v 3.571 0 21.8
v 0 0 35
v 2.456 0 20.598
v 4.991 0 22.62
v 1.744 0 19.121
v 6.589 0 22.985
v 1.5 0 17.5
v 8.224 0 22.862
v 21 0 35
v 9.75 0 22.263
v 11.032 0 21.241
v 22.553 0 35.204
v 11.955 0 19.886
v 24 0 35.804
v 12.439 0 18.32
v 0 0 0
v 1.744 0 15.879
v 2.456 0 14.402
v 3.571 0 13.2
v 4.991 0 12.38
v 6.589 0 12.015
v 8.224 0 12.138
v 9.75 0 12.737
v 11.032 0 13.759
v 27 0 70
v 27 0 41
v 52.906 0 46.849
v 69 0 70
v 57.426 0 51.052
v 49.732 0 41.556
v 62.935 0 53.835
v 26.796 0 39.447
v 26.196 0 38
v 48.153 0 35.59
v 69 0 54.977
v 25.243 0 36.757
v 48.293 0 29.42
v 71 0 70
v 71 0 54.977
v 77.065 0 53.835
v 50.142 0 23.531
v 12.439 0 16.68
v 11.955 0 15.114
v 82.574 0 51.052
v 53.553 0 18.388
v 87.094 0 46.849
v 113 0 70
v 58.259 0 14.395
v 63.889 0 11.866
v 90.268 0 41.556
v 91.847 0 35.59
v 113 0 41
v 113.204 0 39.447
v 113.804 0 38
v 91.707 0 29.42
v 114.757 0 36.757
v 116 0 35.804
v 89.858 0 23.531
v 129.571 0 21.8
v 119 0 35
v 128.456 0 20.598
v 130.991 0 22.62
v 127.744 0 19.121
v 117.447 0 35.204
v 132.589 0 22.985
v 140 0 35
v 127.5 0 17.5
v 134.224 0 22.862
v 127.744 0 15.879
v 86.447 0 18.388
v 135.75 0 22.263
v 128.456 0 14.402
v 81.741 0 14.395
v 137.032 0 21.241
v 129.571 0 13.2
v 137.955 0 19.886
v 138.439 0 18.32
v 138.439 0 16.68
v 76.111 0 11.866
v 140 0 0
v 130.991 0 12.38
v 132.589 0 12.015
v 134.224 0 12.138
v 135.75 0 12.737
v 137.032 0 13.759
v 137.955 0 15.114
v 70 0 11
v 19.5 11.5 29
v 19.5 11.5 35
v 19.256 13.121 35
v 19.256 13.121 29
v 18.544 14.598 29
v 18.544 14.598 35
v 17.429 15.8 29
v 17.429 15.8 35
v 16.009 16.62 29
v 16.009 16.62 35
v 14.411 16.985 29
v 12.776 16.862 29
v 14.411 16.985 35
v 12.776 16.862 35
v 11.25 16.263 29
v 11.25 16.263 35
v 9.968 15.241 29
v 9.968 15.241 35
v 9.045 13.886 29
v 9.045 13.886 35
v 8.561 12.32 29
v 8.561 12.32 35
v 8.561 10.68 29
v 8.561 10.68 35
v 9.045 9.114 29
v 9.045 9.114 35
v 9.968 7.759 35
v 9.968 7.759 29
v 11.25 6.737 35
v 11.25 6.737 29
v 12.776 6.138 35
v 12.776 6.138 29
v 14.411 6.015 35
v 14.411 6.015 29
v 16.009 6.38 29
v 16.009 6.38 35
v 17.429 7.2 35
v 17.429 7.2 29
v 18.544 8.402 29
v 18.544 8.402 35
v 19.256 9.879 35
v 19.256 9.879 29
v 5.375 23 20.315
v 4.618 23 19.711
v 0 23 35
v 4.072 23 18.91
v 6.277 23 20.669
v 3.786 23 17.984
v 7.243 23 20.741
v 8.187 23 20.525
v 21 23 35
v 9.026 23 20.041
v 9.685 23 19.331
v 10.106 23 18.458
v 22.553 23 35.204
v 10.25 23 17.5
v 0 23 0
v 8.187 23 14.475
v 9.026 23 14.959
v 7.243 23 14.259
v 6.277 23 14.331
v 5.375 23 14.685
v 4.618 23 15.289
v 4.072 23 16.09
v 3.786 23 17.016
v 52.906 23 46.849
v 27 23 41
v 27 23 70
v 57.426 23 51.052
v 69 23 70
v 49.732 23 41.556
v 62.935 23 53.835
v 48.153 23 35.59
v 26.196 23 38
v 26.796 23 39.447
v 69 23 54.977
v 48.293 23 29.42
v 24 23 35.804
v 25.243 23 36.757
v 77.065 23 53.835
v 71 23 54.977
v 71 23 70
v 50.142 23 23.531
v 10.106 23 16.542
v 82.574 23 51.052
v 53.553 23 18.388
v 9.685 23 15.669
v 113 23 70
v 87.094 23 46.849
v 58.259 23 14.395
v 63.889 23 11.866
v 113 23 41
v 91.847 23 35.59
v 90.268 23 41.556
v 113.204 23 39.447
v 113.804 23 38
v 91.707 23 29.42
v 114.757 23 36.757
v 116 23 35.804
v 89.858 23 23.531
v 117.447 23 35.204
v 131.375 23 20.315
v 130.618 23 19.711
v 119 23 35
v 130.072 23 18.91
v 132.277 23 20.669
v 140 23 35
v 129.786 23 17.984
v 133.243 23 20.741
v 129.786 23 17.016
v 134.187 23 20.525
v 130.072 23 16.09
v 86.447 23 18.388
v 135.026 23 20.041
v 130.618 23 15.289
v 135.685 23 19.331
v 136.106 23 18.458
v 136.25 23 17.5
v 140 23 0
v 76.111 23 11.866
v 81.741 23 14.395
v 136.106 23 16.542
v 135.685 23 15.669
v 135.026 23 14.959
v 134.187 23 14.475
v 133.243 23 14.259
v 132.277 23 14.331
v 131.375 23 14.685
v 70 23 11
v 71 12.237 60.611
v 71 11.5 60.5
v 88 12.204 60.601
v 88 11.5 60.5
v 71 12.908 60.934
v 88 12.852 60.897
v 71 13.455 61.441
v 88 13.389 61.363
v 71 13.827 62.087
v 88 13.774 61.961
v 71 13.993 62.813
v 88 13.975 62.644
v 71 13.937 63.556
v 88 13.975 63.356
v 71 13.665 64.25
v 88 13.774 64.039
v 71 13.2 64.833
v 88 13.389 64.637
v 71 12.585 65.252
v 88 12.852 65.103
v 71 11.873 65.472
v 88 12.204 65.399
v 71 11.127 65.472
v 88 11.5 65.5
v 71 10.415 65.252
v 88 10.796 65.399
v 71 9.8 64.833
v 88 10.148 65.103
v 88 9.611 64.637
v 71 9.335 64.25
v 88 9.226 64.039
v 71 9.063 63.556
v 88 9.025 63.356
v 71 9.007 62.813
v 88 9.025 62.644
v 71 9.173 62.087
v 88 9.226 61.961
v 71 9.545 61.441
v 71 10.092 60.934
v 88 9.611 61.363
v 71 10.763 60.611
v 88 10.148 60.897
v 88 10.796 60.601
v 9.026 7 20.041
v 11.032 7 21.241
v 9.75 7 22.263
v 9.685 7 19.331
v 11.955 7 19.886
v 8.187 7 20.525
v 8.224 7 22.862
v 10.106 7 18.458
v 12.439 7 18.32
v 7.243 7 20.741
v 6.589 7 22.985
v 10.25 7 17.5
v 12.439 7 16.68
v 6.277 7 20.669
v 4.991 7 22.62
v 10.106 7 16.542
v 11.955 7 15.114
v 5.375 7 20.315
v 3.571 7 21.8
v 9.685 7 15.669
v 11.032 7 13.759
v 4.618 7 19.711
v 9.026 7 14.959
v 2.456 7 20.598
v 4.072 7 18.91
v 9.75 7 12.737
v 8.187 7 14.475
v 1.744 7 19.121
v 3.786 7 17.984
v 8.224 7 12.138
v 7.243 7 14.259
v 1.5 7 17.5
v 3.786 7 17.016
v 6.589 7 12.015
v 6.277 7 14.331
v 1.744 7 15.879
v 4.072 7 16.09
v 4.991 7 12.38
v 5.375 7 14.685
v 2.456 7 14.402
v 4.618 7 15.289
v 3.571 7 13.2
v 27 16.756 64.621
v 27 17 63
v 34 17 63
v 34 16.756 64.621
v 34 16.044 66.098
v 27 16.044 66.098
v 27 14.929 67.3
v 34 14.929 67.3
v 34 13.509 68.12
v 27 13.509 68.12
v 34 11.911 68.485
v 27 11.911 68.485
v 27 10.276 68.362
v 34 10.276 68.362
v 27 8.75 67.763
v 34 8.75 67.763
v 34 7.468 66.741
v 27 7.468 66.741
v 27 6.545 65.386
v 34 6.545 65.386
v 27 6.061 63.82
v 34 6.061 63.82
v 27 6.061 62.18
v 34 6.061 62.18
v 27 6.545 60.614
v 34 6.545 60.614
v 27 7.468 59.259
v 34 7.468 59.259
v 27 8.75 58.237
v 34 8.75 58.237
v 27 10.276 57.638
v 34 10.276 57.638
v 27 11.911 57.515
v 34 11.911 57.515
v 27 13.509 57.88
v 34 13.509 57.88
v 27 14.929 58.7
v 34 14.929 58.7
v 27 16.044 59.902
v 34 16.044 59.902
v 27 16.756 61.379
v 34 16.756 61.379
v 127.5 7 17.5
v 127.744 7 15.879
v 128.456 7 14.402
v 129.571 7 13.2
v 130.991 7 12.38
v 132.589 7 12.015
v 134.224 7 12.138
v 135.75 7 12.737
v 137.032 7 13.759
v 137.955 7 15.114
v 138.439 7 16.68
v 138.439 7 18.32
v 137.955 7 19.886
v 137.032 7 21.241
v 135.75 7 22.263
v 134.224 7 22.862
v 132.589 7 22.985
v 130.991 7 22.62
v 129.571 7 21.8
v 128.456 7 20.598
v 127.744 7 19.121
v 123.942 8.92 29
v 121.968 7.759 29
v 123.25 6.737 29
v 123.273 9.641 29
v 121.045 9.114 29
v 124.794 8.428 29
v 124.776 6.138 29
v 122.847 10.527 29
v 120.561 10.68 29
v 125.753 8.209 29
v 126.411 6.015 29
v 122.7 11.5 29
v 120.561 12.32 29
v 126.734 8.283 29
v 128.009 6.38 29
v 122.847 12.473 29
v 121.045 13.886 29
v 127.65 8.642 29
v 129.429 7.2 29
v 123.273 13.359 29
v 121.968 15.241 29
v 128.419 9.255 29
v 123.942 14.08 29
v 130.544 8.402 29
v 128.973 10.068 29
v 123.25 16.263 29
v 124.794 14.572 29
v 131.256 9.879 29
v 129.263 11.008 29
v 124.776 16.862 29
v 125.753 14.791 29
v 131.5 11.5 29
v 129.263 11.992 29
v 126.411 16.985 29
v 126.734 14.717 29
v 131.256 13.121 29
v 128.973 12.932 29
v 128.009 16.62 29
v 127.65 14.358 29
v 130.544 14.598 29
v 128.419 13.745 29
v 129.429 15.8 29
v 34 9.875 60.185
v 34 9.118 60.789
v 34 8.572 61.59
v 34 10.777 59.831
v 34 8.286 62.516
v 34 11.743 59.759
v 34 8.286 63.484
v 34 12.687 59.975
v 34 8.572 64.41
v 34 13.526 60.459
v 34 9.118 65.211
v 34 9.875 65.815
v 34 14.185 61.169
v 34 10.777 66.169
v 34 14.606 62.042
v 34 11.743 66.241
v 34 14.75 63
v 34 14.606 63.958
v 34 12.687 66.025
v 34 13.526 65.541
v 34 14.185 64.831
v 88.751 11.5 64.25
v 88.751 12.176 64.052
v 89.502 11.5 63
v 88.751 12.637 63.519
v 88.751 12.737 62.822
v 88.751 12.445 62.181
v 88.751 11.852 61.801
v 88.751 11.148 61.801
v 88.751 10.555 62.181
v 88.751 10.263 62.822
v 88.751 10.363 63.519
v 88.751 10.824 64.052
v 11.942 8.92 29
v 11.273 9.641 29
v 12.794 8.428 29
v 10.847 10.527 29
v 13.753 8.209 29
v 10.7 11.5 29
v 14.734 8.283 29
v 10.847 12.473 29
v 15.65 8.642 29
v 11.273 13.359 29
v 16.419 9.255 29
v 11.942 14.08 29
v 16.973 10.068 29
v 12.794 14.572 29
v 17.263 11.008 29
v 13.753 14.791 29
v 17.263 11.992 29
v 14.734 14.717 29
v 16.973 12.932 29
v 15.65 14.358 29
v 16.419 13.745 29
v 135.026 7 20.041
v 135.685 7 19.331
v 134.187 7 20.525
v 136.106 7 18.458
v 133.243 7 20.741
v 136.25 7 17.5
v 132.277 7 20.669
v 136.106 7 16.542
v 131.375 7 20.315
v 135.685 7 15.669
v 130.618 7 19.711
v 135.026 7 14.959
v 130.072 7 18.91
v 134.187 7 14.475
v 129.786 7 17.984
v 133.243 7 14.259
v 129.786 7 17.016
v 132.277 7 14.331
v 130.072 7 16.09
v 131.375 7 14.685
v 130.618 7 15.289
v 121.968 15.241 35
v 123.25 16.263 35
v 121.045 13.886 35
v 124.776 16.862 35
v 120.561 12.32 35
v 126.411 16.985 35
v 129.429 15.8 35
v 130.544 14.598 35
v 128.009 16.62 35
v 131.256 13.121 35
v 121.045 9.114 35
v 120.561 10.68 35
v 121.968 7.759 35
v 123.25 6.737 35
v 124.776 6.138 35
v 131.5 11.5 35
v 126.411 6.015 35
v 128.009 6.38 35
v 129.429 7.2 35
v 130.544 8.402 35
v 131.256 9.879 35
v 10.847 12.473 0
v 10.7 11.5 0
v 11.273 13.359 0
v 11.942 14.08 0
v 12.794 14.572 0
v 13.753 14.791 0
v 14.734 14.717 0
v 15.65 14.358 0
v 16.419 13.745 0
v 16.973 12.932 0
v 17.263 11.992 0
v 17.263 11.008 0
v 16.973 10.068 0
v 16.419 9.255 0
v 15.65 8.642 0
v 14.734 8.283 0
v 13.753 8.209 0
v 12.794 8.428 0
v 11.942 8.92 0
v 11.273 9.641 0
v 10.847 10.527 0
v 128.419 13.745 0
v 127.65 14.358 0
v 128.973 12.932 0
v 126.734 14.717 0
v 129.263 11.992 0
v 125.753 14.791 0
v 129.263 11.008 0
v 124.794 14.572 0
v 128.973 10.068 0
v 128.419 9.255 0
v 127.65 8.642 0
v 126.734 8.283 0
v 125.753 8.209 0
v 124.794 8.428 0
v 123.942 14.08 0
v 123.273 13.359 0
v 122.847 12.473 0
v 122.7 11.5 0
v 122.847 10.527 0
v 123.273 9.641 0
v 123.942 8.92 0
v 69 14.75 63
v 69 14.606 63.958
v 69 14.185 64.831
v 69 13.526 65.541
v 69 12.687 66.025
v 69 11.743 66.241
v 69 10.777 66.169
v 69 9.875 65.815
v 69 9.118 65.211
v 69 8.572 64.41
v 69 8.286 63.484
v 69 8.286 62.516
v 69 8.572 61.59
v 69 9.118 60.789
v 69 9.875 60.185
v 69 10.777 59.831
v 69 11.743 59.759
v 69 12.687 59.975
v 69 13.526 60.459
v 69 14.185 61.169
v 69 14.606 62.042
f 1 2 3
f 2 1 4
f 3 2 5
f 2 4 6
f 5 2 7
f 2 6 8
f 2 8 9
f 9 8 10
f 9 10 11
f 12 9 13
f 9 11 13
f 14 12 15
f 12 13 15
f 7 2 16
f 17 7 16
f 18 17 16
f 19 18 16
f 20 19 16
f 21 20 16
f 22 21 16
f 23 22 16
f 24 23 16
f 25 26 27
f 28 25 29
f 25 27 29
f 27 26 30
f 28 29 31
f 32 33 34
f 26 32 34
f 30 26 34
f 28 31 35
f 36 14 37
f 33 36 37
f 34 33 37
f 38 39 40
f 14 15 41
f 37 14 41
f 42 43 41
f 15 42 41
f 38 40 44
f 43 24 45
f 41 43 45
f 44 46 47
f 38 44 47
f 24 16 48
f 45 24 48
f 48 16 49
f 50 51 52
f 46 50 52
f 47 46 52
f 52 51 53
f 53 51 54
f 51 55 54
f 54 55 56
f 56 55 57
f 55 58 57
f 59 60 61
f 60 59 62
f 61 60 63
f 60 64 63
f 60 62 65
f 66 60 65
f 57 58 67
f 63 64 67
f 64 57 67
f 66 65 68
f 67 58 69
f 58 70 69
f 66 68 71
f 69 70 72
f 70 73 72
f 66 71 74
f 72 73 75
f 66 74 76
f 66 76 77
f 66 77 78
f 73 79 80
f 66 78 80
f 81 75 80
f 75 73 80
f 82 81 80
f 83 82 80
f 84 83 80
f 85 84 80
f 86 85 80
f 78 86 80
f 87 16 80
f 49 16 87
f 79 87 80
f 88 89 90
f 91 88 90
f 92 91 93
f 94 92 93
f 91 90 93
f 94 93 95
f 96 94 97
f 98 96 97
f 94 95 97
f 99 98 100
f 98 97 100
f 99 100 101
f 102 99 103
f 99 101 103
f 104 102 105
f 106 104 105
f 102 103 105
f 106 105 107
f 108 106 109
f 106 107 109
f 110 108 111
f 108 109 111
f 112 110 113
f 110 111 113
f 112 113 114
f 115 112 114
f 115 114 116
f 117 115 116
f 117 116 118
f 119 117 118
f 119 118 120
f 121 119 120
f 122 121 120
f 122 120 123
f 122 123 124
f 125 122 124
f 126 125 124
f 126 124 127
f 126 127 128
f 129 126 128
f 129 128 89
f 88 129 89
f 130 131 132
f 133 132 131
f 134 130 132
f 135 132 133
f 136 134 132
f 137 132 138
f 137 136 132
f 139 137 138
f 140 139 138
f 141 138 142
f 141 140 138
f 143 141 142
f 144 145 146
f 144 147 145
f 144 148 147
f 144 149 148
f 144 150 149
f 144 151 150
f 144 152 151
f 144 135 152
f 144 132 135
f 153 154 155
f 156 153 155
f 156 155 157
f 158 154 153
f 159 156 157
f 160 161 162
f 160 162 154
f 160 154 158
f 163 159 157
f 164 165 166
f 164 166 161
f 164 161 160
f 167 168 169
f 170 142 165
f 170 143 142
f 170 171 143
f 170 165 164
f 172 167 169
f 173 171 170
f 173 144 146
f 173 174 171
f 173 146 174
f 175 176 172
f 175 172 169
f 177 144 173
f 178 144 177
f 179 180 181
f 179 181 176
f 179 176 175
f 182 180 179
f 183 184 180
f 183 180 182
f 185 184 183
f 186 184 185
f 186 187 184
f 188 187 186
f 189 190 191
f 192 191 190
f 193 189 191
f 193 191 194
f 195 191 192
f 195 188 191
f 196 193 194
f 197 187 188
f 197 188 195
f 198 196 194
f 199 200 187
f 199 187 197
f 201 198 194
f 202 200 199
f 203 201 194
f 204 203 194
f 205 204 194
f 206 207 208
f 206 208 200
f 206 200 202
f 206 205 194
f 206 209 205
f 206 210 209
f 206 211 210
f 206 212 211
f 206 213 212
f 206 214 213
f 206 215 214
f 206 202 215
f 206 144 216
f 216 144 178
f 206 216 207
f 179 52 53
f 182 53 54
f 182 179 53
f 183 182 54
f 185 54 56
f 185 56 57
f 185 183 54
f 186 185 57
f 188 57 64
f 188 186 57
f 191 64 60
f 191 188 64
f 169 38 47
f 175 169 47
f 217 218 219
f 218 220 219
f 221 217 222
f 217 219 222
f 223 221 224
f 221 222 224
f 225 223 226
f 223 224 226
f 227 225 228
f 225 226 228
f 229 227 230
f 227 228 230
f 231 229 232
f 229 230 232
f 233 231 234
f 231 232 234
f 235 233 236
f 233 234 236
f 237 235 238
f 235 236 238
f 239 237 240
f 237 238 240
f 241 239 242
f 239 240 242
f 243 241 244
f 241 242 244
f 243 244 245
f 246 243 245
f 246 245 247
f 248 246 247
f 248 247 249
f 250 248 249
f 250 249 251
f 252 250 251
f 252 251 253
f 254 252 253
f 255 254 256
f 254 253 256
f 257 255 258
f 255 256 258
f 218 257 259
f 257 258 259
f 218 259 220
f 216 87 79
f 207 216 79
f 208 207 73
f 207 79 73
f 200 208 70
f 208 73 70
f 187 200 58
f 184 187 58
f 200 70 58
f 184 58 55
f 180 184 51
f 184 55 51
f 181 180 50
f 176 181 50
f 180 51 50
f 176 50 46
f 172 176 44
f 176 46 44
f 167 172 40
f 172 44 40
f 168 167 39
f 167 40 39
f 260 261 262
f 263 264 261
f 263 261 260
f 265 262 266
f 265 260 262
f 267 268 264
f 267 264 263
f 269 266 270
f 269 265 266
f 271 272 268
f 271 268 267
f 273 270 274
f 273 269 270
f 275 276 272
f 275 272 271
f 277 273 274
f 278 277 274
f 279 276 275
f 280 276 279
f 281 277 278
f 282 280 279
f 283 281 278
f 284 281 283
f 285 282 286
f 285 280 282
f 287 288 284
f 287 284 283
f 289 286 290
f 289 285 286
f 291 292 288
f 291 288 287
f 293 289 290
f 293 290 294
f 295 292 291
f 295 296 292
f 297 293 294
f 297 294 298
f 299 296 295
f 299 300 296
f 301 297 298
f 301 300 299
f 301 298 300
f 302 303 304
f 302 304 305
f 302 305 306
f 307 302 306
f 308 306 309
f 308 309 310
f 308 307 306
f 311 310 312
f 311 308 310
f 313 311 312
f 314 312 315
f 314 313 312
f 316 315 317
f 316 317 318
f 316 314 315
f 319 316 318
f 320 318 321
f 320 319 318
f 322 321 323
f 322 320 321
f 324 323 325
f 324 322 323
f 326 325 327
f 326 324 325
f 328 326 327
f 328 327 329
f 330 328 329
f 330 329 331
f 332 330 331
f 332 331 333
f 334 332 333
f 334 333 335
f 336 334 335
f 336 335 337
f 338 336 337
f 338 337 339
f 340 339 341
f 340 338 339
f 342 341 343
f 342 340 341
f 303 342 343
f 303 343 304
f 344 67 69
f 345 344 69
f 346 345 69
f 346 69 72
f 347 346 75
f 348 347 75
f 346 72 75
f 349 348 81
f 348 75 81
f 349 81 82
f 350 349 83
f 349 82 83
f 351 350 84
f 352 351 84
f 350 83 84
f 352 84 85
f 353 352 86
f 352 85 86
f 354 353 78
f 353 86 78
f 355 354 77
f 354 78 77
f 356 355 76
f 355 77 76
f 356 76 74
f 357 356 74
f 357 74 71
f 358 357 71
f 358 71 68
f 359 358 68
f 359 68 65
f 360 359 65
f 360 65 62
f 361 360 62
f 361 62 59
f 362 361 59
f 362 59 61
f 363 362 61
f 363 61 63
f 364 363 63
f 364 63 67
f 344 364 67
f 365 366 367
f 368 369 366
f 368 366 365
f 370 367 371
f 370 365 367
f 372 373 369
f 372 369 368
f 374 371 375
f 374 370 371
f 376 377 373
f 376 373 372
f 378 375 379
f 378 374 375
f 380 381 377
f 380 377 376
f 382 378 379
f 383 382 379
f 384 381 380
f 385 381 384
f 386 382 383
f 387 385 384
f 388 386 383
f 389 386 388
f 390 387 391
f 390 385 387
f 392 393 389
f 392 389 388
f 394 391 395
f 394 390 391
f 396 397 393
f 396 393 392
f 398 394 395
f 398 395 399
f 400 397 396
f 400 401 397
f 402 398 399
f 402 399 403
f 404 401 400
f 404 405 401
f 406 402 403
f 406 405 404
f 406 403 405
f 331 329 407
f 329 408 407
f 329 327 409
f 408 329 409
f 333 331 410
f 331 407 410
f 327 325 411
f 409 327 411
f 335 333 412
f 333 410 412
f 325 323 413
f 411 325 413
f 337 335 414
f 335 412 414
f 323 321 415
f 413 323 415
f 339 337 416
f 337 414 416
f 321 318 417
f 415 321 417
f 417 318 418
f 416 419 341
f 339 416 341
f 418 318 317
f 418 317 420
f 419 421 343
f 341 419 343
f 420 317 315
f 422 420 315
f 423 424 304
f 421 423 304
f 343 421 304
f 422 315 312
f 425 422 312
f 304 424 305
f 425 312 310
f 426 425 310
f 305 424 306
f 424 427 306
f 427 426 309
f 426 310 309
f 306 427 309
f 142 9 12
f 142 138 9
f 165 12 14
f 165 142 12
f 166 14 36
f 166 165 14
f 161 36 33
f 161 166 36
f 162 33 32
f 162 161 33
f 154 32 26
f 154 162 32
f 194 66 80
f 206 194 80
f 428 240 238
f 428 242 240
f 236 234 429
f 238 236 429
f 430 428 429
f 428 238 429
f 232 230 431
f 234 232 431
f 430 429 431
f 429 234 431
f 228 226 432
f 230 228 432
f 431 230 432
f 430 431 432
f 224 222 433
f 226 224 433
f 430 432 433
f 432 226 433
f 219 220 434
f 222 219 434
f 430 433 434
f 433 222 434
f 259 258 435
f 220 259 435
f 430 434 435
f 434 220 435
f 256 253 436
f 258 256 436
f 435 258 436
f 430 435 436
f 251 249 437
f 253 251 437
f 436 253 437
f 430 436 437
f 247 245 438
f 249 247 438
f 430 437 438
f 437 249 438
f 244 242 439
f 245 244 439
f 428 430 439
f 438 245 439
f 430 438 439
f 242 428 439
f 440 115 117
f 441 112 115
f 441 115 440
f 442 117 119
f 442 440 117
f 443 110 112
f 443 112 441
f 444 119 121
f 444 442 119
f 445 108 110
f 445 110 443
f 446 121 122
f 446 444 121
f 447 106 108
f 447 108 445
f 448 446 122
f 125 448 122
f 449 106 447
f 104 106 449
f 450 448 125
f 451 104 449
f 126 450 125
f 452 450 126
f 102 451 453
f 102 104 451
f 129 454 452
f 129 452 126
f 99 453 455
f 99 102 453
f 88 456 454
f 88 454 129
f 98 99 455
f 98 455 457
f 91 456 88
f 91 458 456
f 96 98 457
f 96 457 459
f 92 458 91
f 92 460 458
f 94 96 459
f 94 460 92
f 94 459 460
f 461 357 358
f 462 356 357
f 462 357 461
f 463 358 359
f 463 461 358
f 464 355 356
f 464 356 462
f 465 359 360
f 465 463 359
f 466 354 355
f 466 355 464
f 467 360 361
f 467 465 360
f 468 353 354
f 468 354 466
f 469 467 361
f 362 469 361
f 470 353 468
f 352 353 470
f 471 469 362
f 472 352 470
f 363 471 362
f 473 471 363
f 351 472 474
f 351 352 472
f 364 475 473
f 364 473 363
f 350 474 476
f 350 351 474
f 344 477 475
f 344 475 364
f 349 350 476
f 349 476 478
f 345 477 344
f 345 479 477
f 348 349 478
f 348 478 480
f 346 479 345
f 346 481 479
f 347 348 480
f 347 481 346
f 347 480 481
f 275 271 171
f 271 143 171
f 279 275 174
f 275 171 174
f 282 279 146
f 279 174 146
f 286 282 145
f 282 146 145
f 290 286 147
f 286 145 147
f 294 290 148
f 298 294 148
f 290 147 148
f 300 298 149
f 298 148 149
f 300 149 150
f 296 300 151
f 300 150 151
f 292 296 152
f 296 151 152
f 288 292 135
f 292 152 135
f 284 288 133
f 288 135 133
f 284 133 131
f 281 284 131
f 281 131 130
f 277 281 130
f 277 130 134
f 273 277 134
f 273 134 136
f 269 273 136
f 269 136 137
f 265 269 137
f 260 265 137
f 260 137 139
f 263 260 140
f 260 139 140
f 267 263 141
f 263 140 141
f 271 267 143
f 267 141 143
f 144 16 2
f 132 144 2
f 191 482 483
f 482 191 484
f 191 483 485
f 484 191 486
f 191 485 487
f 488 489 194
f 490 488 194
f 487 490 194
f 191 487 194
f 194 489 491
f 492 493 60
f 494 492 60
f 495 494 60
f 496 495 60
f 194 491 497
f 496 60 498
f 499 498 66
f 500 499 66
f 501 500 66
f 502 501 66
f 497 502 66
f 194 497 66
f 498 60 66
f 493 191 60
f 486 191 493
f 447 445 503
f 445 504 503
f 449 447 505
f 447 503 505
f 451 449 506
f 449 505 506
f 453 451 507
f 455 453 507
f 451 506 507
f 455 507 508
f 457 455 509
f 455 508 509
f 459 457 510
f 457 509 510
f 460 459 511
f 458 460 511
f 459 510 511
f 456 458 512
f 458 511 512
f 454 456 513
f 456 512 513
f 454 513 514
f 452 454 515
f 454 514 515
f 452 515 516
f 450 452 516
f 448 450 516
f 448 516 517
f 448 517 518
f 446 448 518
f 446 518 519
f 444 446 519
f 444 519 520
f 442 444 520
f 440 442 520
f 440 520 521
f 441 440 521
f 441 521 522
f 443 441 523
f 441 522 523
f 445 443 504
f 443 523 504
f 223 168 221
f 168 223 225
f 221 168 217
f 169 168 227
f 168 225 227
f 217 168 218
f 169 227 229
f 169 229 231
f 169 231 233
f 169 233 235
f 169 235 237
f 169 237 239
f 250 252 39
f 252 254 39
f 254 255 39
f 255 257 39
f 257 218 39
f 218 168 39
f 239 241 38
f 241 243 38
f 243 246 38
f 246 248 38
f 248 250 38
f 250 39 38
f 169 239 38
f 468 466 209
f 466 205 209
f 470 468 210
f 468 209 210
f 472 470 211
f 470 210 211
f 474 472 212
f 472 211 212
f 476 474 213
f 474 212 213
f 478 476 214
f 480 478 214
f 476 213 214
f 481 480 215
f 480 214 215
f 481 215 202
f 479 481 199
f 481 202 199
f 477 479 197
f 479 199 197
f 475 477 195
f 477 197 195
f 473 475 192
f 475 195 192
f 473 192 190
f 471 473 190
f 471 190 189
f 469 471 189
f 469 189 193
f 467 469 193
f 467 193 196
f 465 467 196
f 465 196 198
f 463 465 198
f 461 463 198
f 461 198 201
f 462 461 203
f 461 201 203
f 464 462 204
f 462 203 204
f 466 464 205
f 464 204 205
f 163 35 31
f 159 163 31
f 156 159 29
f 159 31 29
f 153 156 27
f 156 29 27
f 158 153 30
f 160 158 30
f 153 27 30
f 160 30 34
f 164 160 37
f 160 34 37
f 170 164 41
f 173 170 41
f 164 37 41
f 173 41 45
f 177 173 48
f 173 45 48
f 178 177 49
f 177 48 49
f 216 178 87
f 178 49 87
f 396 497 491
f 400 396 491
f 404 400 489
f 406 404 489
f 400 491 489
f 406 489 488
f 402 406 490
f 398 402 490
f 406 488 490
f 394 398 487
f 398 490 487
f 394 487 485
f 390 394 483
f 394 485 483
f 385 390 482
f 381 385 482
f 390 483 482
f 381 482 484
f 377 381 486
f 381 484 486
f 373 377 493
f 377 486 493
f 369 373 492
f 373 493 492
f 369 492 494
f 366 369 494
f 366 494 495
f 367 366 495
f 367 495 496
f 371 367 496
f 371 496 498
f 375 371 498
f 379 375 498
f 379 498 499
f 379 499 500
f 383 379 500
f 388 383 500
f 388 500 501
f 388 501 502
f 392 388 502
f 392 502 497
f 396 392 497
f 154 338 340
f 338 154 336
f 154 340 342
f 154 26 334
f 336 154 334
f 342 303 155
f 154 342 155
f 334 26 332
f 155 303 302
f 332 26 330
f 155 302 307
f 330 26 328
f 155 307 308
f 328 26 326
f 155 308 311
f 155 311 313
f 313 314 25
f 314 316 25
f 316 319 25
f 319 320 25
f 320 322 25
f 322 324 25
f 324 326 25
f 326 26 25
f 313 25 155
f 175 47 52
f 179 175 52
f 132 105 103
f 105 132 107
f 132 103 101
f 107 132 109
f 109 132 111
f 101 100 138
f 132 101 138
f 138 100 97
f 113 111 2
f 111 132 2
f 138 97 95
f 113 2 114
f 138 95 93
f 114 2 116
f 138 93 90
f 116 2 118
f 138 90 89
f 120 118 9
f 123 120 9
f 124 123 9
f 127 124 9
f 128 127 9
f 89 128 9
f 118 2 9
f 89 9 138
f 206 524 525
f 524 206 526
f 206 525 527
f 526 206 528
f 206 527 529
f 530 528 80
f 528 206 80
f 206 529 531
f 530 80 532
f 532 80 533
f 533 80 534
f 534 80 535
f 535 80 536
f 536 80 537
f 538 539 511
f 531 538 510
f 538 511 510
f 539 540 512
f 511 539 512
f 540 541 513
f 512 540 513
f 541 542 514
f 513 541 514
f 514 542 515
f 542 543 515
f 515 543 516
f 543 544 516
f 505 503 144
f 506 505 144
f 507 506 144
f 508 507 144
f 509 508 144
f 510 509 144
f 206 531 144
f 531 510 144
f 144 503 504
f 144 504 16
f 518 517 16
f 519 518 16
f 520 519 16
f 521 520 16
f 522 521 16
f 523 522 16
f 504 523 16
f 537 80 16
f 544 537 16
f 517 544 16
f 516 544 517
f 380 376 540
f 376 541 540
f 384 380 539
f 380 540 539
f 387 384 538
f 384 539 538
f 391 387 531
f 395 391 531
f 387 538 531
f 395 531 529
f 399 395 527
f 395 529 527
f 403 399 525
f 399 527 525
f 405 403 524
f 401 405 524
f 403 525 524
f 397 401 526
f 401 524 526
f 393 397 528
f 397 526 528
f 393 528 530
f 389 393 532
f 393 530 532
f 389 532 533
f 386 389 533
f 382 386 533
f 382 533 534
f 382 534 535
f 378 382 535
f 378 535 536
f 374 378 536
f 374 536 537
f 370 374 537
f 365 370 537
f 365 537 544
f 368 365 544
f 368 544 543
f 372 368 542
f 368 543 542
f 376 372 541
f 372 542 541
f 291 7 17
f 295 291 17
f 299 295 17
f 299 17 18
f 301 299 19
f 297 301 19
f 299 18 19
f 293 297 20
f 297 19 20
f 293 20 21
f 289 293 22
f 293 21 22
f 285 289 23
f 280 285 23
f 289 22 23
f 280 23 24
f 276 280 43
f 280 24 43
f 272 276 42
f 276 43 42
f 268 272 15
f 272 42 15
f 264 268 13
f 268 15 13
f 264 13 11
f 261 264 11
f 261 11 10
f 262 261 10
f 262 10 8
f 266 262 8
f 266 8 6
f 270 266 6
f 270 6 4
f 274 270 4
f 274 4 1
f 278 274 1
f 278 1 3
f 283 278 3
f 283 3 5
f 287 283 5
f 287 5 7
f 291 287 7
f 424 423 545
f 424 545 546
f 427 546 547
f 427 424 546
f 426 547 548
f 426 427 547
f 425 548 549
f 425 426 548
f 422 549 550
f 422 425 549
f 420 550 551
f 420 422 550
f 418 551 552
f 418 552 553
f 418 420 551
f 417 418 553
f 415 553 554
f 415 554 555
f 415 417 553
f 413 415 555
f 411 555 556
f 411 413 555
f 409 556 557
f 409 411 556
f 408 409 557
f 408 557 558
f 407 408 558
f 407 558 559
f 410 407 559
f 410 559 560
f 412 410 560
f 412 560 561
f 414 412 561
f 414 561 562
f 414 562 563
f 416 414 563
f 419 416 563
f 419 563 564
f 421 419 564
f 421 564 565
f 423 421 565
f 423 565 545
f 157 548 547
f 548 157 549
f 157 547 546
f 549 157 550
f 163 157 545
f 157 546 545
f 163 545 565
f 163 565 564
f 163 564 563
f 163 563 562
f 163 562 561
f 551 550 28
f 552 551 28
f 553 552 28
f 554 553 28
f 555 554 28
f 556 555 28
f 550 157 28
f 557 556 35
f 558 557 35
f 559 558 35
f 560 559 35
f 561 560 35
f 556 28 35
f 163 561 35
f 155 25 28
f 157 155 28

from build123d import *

# Parameters (mm, degrees)
DODANIE_WYCI_GNI_CIE1_DEPTH                        = 23
ZAOKR_GLENIE1_R                                    = 6
POG_BIENIE_START                                   = 27
POG_BIENIE_WALCOWE_POD_M6_WKR_T_DO_C_2_R           = 3.25
POG_BIENIE_WALCOWE_POD_M6_WKR_T_DO_CZ_CI_DEPTH     = 42
POG_BIENIE_WALCOWE_POD_M6_WKR_T_DO_C_3_O_R         = 5.5
POG_BIENIE_WALCOWE_POD_M6_WKR_T_DO_C_3_O_R_2       = 3.25
POG_BIENIE_WALCOWE_POD_M6_WKR_T_DO_C_3_DEPTH       = 7
OTW_R_GWINTOWANY_M6X1_01_D                         = 5
OTW_R_GWINTOWANY_M6X1_01_DEPTH                     = 17
OTW_R_GWINTOWANY_M6X1_01_TIP                       = 1.502151548
POG_BIENIE_WALCOWE_POD_M6_WKR_T_DO_C_4_D           = 6.6
POG_BIENIE_WALCOWE_POD_M6_WKR_T_DO_C_4_CBORE_D     = 11
POG_BIENIE_WALCOWE_POD_M6_WKR_T_DO_C_4_CBORE_DEPTH = 6
POG_BIENIE_WALCOWE_POD_M6_WKR_T_DO_C_5_D           = 6.5
POG_BIENIE_WALCOWE_POD_M6_WKR_T_DO_C_5_CBORE_D     = 11
POG_BIENIE_WALCOWE_POD_M6_WKR_T_DO_C_5_CBORE_DEPTH = 7


# Read off the part's stored shape, not the designer's step: Pogłębienie walcowe pod M6 Wkręt do części metalowych z łbem sześciokątnym1
with BuildPart() as part:
    # Szkic1 → Dodanie-wyciągnięcie1 (new body)
    with BuildSketch(Plane(origin=(0, 0, 0), x_dir=(1, 0, 0), z_dir=(0, 1, 0))):
        with BuildLine():
            Line((0, 0), (0, -35))
            Line((0, -35), (27, -35))
            Line((27, -35), (27, -70))
            Line((27, -70), (69, -70))
            Line((69, -70), (69, -54.977260976))
            ThreePointArc((69, -54.977260976), (48.005685491, -32.499870751), (70, -11))
            Line((70, -11), (70, 0))
            Line((70, 0), (0, 0))
        make_face()
        with BuildLine():
            Line((140, 0), (70, 0))
            Line((70, 0), (70, -11))
            ThreePointArc((70, -11), (91.994314509, -32.499870751), (71, -54.977260976))
            Line((71, -54.977260976), (71, -70))
            Line((71, -70), (113, -70))
            Line((113, -70), (113, -35))
            Line((113, -35), (140, -35))
            Line((140, -35), (140, 0))
        make_face()
    extrude(amount=DODANIE_WYCI_GNI_CIE1_DEPTH)

    # Zaokrąglenie1
    zaokr_glenie1_edges = [part.edges().sort_by_distance(p)[0] for p in [
        (27, 11.5, 35),
        (113, 11.5, 35),
    ]]
    fillet(zaokr_glenie1_edges, radius=ZAOKR_GLENIE1_R)

    # Pog_bienie walcowe pod M6 Wkr_t do c 2 → Pog_bienie walcowe pod M6 Wkr_t do cz_ci (cut)
    with BuildSketch(Plane.YZ.offset(POG_BIENIE_START)):
        with Locations((11.5, 63)):
            Circle(POG_BIENIE_WALCOWE_POD_M6_WKR_T_DO_C_2_R)
    extrude(amount=POG_BIENIE_WALCOWE_POD_M6_WKR_T_DO_CZ_CI_DEPTH, mode=Mode.SUBTRACT)

    # Pog_bienie walcowe pod M6 Wkr_t do c 3 o → Pog_bienie walcowe pod M6 Wkr_t do c 3 (cut)
    with BuildSketch(Plane.YZ.offset(POG_BIENIE_START)):
        with Locations((11.5, 63)):
            Circle(POG_BIENIE_WALCOWE_POD_M6_WKR_T_DO_C_3_O_R)
        with Locations((11.5, 63)):
            Circle(POG_BIENIE_WALCOWE_POD_M6_WKR_T_DO_C_3_O_R_2, mode=Mode.SUBTRACT)
    extrude(amount=POG_BIENIE_WALCOWE_POD_M6_WKR_T_DO_C_3_DEPTH, mode=Mode.SUBTRACT)

    # Otwór gwintowany M6x1.01
    with Locations(Plane.ZY.offset(-71)):
        with Locations((63, 11.5)):
            Hole(OTW_R_GWINTOWANY_M6X1_01_D / 2, depth=OTW_R_GWINTOWANY_M6X1_01_DEPTH)
            with Locations((0, 0, -(OTW_R_GWINTOWANY_M6X1_01_DEPTH + OTW_R_GWINTOWANY_M6X1_01_TIP / 2))):  # 118° drill point
                Cone(0, OTW_R_GWINTOWANY_M6X1_01_D / 2, OTW_R_GWINTOWANY_M6X1_01_TIP, mode=Mode.SUBTRACT)

    # Pog_bienie walcowe pod M6 Wkr_t do c 4 (through all)
    with Locations(Plane.XY.offset(35)):
        with Locations((14, 11.5), (126, 11.5)):
            CounterBoreHole(POG_BIENIE_WALCOWE_POD_M6_WKR_T_DO_C_4_D / 2, POG_BIENIE_WALCOWE_POD_M6_WKR_T_DO_C_4_CBORE_D / 2, POG_BIENIE_WALCOWE_POD_M6_WKR_T_DO_C_4_CBORE_DEPTH)

    # Pog_bienie walcowe pod M6 Wkr_t do c 5 (through all)
    with Locations(Plane(origin=(0, 0, 0), x_dir=(-1, 0, 0), z_dir=(0, -1, 0))):
        with Locations((-7, -17.5), (-133, -17.5)):
            CounterBoreHole(POG_BIENIE_WALCOWE_POD_M6_WKR_T_DO_C_5_D / 2, POG_BIENIE_WALCOWE_POD_M6_WKR_T_DO_C_5_CBORE_D / 2, POG_BIENIE_WALCOWE_POD_M6_WKR_T_DO_C_5_CBORE_DEPTH)


solid = part.part
